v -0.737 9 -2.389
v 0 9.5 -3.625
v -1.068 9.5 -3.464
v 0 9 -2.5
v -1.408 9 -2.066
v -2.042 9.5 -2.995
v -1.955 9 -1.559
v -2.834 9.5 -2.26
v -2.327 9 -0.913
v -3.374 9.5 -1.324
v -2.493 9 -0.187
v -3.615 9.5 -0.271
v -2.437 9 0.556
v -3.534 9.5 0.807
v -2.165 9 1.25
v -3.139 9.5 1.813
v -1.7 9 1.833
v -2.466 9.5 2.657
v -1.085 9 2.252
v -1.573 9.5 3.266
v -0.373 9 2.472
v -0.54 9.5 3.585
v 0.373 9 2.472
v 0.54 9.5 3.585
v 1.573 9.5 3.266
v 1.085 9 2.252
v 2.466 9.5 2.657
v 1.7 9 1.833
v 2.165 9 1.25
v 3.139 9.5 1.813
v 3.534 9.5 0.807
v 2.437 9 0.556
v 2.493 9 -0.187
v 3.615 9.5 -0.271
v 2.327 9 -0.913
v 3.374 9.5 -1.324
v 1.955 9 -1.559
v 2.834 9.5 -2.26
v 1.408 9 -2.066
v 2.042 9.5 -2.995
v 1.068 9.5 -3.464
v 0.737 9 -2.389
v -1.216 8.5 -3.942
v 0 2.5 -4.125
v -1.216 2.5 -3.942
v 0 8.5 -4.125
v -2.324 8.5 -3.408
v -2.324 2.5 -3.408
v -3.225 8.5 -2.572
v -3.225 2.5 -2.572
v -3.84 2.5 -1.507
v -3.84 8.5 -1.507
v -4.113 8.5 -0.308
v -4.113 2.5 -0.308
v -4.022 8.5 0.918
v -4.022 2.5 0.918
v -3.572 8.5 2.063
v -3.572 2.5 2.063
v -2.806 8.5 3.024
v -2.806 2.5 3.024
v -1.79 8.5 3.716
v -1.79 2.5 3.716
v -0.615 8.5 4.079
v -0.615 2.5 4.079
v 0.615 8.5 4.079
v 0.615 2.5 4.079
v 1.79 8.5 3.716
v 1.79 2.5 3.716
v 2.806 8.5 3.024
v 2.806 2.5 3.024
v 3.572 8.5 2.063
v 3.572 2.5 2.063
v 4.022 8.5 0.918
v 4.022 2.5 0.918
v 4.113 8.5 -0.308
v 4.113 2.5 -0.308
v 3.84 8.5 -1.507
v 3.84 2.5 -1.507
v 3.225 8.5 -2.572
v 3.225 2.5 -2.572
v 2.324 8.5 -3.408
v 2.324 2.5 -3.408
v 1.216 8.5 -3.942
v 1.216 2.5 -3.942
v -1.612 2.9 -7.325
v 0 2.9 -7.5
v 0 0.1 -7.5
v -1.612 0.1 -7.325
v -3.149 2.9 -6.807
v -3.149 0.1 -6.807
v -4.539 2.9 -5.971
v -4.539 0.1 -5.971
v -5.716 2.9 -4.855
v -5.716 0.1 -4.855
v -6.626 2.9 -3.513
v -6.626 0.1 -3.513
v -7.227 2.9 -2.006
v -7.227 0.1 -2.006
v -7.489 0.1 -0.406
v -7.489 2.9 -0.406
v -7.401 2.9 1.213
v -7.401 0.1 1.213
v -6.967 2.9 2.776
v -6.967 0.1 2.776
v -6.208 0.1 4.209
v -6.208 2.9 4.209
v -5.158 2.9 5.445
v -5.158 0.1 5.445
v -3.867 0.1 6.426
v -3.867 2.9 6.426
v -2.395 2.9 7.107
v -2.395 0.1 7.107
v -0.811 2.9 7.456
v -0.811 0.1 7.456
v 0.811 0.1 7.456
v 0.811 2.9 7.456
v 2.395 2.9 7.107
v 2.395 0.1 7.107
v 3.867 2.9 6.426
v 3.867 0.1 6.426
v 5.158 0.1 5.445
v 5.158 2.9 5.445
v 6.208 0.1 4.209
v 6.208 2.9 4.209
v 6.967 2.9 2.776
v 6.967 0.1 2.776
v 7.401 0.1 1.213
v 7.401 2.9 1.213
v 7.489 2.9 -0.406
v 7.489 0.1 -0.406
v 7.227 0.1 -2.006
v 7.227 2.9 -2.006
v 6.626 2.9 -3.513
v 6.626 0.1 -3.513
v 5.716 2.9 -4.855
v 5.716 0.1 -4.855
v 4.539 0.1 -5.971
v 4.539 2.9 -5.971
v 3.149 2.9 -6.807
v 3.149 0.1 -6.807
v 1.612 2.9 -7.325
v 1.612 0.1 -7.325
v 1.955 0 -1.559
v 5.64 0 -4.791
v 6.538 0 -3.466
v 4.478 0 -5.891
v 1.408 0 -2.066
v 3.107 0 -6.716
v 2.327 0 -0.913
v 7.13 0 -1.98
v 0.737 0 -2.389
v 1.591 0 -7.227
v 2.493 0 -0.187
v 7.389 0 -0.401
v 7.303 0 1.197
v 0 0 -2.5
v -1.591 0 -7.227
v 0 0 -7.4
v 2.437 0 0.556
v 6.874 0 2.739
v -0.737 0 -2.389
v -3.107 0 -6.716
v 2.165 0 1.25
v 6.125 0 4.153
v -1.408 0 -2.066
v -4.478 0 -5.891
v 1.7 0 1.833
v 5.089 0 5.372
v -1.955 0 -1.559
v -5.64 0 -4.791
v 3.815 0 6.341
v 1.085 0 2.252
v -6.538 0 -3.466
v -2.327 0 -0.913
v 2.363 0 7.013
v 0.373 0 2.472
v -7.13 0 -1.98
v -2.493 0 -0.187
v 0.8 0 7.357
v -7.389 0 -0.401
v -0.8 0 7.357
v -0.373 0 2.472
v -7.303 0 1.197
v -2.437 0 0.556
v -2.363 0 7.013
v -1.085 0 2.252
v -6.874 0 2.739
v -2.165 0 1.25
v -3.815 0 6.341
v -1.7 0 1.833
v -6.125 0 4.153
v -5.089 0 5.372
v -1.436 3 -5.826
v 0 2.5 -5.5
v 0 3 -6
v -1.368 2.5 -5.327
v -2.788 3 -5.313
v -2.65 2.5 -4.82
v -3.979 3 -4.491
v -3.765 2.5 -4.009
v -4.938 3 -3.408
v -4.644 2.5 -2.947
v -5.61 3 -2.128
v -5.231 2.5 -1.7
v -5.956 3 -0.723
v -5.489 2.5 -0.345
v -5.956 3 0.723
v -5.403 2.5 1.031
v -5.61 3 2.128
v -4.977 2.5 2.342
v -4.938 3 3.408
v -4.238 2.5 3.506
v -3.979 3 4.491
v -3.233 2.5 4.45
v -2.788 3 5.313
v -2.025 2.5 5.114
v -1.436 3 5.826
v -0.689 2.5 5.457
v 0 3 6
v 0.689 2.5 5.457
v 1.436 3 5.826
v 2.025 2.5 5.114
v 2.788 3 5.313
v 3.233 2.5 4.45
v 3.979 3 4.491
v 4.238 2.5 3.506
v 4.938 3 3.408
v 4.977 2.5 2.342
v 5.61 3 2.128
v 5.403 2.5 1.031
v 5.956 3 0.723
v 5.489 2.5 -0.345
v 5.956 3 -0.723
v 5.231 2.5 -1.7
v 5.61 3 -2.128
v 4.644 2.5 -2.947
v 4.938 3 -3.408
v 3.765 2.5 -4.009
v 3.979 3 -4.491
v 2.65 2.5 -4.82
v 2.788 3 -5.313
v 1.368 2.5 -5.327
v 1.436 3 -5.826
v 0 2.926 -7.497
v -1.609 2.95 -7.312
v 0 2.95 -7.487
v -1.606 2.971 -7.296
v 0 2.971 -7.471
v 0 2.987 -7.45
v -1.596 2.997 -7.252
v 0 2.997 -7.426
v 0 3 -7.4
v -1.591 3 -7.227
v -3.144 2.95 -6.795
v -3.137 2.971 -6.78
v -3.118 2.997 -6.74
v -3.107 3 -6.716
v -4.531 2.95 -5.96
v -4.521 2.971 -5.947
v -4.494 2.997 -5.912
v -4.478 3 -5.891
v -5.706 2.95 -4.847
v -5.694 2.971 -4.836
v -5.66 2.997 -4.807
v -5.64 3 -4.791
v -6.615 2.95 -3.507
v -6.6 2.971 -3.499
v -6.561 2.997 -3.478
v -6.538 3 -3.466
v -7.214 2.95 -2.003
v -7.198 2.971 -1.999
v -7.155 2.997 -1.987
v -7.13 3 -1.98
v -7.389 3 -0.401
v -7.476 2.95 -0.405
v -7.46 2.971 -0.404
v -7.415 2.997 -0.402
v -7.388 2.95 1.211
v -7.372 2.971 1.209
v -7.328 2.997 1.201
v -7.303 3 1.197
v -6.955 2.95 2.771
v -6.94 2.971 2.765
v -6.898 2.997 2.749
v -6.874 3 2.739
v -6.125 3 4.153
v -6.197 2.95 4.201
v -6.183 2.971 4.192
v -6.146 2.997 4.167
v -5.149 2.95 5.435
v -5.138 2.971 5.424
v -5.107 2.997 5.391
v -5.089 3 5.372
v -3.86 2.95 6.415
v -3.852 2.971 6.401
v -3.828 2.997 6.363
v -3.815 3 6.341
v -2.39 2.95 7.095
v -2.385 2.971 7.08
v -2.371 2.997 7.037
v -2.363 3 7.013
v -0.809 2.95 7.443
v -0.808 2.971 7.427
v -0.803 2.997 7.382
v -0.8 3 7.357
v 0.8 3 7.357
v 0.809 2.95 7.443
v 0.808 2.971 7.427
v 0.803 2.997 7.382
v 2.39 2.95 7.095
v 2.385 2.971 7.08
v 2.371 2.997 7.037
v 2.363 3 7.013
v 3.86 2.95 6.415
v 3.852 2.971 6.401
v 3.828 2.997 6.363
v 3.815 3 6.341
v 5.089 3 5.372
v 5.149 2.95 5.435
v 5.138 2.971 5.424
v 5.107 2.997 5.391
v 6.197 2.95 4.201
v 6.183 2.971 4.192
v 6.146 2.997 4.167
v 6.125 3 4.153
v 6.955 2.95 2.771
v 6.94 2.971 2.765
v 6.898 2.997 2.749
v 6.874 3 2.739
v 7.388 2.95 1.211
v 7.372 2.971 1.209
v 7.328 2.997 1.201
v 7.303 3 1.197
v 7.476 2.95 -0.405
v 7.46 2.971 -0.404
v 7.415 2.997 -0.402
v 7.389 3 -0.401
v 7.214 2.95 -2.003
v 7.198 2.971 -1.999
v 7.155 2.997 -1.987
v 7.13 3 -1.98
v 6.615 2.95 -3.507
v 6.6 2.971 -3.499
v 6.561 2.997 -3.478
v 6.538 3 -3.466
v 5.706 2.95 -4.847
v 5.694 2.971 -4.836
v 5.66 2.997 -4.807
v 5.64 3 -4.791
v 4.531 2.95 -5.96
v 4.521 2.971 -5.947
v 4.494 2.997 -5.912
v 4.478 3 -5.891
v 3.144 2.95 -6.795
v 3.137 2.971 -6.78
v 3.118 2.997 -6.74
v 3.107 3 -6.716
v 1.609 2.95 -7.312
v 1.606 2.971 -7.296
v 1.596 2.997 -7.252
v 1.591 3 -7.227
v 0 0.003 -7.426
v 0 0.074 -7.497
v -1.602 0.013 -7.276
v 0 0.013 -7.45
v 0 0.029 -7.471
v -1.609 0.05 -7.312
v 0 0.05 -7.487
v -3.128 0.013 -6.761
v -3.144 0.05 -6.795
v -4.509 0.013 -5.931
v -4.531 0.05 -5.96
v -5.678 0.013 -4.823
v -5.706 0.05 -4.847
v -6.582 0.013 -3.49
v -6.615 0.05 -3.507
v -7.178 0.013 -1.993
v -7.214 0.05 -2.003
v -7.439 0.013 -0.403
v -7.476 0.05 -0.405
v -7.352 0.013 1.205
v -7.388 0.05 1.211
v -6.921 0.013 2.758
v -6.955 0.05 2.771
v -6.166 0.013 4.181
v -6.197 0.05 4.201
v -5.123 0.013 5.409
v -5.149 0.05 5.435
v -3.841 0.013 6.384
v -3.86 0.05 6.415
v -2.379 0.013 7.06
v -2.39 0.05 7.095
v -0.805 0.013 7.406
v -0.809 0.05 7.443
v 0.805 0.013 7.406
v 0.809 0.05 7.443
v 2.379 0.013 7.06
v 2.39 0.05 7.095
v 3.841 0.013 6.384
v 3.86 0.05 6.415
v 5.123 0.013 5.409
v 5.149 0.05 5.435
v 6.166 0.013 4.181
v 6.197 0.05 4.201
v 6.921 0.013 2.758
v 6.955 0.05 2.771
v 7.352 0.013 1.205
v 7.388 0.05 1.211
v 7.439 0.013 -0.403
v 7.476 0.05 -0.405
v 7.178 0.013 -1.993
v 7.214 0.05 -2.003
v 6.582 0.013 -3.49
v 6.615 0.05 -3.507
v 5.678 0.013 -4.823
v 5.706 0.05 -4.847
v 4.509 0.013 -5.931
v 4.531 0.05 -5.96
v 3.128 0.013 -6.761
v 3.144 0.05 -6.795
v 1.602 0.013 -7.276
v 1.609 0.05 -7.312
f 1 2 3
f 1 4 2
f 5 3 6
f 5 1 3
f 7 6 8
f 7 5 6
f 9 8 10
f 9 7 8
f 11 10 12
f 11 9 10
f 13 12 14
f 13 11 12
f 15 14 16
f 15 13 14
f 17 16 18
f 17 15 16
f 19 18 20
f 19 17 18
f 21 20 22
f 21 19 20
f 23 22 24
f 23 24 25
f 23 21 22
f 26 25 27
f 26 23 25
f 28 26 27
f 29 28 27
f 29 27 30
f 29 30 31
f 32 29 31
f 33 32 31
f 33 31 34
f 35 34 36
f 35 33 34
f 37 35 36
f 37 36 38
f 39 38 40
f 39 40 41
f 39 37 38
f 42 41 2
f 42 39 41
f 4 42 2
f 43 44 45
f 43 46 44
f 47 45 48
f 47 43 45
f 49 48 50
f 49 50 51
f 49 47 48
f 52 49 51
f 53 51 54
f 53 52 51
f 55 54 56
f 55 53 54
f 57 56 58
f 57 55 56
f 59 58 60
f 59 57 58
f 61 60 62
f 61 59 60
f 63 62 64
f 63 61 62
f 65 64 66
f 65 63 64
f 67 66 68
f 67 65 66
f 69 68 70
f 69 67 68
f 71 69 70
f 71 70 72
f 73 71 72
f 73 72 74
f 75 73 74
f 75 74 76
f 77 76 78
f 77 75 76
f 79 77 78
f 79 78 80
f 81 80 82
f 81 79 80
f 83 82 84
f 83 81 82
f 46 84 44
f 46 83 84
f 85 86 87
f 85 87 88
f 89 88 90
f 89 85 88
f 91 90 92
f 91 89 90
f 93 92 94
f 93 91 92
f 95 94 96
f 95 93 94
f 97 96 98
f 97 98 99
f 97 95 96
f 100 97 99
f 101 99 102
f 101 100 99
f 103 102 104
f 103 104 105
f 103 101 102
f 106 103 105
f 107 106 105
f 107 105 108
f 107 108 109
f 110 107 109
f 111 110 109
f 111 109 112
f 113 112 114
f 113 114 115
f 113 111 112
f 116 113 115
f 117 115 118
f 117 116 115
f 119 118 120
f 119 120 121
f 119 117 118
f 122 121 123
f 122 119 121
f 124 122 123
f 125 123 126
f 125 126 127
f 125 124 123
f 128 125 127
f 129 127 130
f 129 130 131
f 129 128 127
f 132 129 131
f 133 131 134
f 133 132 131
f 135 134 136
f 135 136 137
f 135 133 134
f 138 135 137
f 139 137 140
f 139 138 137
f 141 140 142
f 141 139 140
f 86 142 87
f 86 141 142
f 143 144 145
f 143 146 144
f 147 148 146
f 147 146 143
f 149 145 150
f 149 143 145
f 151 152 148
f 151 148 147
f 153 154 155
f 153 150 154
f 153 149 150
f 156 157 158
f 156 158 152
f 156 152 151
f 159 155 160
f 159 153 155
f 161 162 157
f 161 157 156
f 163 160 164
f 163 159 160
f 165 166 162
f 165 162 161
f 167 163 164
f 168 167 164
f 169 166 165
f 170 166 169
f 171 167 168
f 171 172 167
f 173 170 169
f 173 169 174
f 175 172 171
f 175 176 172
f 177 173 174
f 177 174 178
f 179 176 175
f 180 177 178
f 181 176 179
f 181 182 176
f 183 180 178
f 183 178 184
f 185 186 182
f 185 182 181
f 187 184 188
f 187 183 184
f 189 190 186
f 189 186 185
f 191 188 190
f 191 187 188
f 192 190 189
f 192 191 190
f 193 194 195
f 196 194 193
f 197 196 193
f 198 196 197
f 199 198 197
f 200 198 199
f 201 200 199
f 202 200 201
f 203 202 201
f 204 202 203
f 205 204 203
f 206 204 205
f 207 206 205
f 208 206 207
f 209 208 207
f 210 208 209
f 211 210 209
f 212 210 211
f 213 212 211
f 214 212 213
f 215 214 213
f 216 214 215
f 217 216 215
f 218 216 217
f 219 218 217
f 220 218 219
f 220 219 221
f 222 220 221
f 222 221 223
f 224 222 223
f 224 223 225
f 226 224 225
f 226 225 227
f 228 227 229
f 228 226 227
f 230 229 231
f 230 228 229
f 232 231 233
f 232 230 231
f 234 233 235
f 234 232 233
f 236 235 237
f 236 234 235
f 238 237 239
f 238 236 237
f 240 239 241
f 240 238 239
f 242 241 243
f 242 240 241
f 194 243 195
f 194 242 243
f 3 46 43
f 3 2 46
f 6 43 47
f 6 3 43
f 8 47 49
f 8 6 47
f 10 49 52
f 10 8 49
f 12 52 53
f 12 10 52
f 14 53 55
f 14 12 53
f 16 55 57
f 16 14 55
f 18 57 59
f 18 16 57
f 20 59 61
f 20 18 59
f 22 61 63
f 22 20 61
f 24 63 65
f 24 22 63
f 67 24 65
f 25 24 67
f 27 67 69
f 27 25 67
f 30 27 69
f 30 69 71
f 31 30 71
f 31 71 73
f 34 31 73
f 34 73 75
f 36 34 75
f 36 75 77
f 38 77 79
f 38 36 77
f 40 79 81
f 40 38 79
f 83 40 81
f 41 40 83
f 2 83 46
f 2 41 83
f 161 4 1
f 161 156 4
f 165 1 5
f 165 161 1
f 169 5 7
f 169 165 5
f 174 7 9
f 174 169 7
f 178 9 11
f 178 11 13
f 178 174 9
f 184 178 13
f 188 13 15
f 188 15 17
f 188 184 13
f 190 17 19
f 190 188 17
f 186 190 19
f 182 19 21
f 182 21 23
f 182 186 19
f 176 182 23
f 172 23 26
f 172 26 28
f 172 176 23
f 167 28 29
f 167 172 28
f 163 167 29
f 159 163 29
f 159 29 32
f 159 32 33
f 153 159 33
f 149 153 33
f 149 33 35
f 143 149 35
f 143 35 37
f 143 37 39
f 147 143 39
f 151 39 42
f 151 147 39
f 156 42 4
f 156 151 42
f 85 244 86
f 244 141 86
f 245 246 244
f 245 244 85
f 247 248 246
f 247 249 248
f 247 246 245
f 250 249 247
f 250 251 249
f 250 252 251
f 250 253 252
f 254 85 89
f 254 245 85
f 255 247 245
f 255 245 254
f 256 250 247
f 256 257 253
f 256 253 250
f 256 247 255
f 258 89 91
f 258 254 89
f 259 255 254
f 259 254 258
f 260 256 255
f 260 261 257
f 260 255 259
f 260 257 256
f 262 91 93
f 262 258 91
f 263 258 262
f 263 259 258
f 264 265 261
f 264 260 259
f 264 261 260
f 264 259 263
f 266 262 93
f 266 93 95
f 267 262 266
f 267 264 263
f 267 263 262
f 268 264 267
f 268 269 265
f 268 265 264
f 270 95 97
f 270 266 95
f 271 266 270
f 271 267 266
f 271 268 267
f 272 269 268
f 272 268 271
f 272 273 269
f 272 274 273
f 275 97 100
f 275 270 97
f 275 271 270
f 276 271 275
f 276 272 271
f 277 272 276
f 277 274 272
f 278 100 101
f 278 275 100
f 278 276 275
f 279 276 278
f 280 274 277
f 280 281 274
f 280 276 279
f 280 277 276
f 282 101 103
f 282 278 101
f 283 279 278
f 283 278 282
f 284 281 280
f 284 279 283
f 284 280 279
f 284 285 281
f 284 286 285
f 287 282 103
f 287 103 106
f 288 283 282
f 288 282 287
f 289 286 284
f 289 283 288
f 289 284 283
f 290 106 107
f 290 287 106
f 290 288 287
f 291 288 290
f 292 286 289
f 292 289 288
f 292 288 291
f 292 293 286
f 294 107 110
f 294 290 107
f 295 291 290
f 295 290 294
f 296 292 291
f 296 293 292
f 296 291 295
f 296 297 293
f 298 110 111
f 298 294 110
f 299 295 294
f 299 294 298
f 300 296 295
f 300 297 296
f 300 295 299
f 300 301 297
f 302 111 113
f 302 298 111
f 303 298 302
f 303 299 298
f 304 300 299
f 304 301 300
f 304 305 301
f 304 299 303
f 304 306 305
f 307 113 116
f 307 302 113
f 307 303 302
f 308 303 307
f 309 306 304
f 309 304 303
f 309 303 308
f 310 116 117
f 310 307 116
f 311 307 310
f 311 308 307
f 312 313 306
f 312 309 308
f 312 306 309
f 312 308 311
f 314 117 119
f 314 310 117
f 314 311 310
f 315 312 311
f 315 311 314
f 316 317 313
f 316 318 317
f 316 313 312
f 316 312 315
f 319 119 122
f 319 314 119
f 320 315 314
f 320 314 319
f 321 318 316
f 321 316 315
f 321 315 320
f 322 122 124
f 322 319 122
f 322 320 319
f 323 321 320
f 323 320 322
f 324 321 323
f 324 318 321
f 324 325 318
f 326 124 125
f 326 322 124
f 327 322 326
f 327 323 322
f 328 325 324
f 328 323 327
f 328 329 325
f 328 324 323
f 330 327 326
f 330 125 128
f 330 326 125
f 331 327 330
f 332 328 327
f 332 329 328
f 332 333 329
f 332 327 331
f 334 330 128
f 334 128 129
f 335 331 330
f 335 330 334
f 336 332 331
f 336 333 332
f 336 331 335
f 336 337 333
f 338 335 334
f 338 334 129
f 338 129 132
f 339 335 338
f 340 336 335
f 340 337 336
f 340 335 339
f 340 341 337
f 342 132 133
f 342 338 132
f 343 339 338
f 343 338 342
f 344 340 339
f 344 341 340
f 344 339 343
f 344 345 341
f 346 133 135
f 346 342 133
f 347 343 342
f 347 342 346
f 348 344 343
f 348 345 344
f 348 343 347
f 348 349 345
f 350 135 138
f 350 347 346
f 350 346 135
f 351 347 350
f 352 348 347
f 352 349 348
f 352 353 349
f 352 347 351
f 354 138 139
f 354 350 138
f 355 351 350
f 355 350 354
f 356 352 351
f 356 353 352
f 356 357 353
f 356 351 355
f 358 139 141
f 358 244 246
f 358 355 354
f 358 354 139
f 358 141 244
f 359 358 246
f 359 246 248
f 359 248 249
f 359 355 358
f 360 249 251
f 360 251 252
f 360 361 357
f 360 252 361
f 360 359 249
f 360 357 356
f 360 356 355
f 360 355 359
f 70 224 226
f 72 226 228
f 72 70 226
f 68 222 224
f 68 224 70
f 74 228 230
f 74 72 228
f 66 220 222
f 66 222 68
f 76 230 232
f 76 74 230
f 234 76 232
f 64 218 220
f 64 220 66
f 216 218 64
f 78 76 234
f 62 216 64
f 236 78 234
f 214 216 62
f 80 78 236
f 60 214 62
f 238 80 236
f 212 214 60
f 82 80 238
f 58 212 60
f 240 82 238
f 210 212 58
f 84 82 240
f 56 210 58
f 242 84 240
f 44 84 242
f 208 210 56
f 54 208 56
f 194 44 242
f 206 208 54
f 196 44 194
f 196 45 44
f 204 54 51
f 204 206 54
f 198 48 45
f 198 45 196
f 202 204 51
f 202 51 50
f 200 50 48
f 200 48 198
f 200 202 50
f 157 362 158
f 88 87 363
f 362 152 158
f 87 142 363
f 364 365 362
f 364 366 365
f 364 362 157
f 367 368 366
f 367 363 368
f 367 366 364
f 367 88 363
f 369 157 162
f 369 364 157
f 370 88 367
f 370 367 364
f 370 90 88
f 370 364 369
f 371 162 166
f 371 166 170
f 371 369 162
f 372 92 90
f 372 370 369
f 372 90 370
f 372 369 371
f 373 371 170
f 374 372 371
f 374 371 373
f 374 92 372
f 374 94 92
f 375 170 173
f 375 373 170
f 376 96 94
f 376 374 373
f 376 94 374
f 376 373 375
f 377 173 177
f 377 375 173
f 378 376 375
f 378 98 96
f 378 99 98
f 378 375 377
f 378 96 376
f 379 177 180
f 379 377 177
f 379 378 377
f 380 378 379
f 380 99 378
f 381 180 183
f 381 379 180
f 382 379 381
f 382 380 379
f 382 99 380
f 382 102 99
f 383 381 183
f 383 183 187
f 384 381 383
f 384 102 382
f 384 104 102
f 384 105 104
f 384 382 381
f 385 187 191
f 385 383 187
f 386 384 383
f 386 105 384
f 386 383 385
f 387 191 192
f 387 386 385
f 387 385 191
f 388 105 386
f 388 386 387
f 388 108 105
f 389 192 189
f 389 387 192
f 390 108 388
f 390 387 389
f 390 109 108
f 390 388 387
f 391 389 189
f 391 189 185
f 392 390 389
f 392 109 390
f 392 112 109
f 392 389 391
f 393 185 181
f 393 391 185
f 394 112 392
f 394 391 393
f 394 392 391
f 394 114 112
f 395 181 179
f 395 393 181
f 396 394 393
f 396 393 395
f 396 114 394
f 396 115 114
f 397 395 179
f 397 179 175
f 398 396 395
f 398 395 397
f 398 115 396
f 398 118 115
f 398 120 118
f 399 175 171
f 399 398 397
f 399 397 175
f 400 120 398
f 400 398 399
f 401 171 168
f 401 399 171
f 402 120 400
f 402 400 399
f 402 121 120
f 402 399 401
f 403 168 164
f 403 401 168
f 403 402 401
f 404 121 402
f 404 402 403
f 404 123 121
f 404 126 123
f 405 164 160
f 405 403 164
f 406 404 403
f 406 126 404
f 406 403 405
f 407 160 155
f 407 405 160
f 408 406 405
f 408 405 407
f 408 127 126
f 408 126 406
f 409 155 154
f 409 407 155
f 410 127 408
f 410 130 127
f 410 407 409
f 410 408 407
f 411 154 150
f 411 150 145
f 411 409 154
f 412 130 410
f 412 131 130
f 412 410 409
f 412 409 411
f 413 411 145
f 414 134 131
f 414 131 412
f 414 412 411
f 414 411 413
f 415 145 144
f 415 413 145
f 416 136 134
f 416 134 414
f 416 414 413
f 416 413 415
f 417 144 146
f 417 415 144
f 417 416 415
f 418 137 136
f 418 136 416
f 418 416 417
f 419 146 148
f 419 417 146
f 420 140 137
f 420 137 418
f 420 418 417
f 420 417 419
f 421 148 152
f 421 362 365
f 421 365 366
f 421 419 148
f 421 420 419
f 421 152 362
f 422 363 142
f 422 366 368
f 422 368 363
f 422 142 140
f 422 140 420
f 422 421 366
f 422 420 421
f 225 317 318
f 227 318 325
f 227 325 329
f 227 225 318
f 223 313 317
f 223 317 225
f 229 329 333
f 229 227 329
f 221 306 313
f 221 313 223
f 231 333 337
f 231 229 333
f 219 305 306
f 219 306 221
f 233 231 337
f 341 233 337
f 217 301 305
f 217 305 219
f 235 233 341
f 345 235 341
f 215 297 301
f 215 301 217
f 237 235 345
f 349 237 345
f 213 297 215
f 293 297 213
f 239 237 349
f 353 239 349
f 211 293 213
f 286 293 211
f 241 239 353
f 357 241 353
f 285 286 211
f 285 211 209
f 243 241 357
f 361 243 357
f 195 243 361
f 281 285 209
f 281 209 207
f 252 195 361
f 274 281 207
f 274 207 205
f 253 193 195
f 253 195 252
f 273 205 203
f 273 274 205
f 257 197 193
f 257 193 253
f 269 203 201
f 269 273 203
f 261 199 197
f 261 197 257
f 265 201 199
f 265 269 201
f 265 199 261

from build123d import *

# Parameters (mm, degrees)
HEADFILLET_R = 0.1


with BuildPart() as part:
    # ProfileS → Profile (revolve)
    with BuildSketch(Plane.XY, mode=Mode.PRIVATE) as profile_sk:
        Polygon((2.5, 0), (7.5, 0), (7.5, 3), (6, 3), (5.5, 2.5), (4.125, 2.5), (4.125, 8.5), (3.625, 9.5), (2.5, 9), align=None)
    revolve(profile_sk.sketch.rotate(Axis((0, 0, 0), (0, 1, 0)), 90), axis=Axis((0, 0, 0), (0, 1, 0)))

    # HeadFillet
    headfillet_edges = [part.edges().sort_by_distance(p)[0] for p in [
        (0, 3, 7.5),
        (0, 0, 7.5),
    ]]
    fillet(headfillet_edges, radius=HEADFILLET_R)


solid = part.part
